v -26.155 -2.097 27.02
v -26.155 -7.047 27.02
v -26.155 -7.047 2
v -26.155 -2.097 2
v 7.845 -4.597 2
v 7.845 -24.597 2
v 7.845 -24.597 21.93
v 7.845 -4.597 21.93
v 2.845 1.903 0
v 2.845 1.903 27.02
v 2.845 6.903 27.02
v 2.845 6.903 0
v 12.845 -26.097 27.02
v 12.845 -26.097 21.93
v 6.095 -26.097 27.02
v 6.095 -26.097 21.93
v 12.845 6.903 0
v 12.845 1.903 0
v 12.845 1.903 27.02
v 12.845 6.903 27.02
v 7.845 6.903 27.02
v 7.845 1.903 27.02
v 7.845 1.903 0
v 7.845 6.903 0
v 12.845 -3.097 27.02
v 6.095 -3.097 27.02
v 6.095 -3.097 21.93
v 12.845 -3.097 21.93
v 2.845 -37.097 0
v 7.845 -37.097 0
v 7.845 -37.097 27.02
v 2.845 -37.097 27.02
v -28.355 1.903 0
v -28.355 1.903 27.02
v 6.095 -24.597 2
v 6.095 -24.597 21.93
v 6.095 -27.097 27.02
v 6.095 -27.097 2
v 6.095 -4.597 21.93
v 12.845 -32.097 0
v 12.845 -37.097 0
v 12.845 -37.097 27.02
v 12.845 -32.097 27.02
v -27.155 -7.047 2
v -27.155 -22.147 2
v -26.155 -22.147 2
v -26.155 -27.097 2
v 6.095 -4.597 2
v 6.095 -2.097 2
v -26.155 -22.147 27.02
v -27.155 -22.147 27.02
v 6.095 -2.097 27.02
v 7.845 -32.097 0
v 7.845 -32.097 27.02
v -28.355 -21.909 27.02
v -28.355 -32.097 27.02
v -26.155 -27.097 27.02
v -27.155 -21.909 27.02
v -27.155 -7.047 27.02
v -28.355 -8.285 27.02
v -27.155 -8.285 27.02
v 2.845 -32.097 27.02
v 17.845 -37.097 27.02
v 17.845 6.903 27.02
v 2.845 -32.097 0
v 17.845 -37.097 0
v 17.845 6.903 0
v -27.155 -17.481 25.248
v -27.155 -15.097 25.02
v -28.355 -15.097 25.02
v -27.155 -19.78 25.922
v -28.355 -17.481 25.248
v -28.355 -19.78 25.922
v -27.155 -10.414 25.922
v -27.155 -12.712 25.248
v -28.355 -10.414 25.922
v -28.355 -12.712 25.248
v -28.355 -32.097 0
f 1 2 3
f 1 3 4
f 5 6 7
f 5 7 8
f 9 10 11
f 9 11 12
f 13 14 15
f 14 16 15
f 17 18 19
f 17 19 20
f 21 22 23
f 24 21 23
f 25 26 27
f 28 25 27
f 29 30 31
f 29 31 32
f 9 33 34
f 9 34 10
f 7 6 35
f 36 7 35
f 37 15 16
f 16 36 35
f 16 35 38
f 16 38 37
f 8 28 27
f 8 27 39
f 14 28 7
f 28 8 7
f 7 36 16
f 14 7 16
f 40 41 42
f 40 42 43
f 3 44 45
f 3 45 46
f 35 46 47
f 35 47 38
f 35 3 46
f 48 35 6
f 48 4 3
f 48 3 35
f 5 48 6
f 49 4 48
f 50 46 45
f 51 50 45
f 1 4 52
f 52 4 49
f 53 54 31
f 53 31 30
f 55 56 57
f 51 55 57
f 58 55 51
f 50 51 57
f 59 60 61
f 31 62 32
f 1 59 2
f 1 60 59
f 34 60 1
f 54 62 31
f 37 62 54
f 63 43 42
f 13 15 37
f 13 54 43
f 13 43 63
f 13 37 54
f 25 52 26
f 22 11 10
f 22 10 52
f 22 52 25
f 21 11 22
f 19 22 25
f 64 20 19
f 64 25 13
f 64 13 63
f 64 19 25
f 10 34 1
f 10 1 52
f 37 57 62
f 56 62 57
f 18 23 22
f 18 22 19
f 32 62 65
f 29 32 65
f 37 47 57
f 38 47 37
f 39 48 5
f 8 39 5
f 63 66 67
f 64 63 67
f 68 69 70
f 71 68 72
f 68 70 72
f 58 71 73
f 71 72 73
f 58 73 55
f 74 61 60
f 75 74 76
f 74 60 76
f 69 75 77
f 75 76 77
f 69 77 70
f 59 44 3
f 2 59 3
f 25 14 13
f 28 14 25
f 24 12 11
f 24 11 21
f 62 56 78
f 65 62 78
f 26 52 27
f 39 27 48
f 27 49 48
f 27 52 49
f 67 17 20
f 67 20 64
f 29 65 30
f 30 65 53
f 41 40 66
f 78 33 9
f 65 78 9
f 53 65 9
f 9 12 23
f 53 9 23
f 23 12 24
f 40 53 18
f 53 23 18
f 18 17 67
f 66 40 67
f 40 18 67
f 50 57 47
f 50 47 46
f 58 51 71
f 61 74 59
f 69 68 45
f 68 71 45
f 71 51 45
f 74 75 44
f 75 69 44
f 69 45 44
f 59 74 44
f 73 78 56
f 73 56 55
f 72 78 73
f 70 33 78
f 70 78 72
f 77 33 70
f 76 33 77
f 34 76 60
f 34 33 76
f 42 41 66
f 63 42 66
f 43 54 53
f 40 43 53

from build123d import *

# Parameters (mm, degrees)
SKETCH1_W                 = 38.2
SKETCH1_H                 = 30
BOSS_EXTRUDE1_DEPTH       = 2
SKETCH2_W                 = 2
SKETCH2_H                 = 20
BOSS_EXTRUDE2_DEPTH       = 27.02
CUT_EXTRUDE1_REACH        = 58.632
SKETCH3_W                 = 7.09
SKETCH3_H                 = 23
CUT_EXTRUDE3_REACH        = 58.632
CUT_EXTRUDE4_DEPTH        = 57.632318808
CUT_EXTRUDE4_DEPTH_BACK   = 57.632318808
SKETCH7_W                 = 32.25
SKETCH7_H                 = 3
BOSS_EXTRUDE3_DEPTH       = 25.02
SKETCH8_W                 = 20
SKETCH8_H                 = 30
BOSS_EXTRUDE4_DEPTH       = 5
BOSS_EXTRUDE5_DEPTH       = 2
BOSS_EXTRUDE6_DEPTH       = 3
BOSS_EXTRUDE7_DEPTH       = 2
SKETCH12_W                = 5
SKETCH12_H                = 27.02
BOSS_EXTRUDE8_DEPTH       = 5
SKETCH13_W                = 5
SKETCH13_H                = 22
BOSS_EXTRUDE10_DEPTH      = 44
SKETCH15_W                = 5
SKETCH15_H                = 27.02
BOSS_EXTRUDE11_DEPTH      = 5
BOSS_EXTRUDE12_DEPTH      = 5.02
BOSS_EXTRUDE12_DEPTH_BACK = 2
SKETCH16_W                = 5
SKETCH16_H                = 44
SKETCH17_W                = 20
SKETCH17_H                = 34
CUT_EXTRUDE5_DEPTH        = 5


with BuildPart() as part:
    # Sketch1 → Boss-Extrude1 (new body)
    with BuildSketch(Plane.XY):
        with Locations((-9.254890621, -15.096829294)):
            Rectangle(SKETCH1_W, SKETCH1_H)
    extrude(amount=BOSS_EXTRUDE1_DEPTH)

    # Sketch2 → Boss-Extrude2 (add)
    with BuildSketch(Plane.XY.offset(2)):
        Polygon((-26.154890621, -2.096829294), (-28.354890621, -2.096829294), (-28.354890621, -30.096829294), (-26.154890621, -30.096829294), (-26.154890621, -22.146829294), (-27.154890621, -22.146829294), (-27.154890621, -7.046829294), (-26.154890621, -7.046829294), align=None)
        Polygon((9.845109379, -0.096829294), (-28.354890621, -0.096829294), (-28.354890621, -2.096829294), (-26.154890621, -2.096829294), (6.095109379, -2.096829294), (9.845109379, -2.096829294), align=None)
        Polygon((9.845109379, -4.596829294), (9.845109379, -2.096829294), (6.095109379, -2.096829294), (6.095109379, -4.596829294), (7.845109379, -4.596829294), align=None)
        with Locations((8.845109379, -14.596829294)):
            Rectangle(SKETCH2_W, SKETCH2_H)
        Polygon((9.845109379, -30.096829294), (9.845109379, -24.596829294), (7.845109379, -24.596829294), (6.095109379, -24.596829294), (6.095109379, -30.096829294), align=None)
    extrude(amount=BOSS_EXTRUDE2_DEPTH)

    # Sketch3 → Cut-Extrude1 (cut, up to next)
    with BuildSketch(Plane(origin=(9.845109379, 0, 0), x_dir=(0, 0, -1), z_dir=(1, 0, 0)), mode=Mode.PRIVATE) as cut_extrude1_sk1:
        with Locations((-25.475, -14.596829294)):
            Rectangle(SKETCH3_W, SKETCH3_H)
    cut_extrude1_tool1 = extrude(cut_extrude1_sk1.sketch, amount=-CUT_EXTRUDE1_REACH, mode=Mode.PRIVATE) & part.part
    add(cut_extrude1_tool1.solids().sort_by_distance((9.845109, -14.596829, 25.475))[0], mode=Mode.SUBTRACT)

    # Sketch4 → Cut-Extrude3 (cut, up to next)
    with BuildSketch(Plane.ZY.offset(28.354890621), mode=Mode.PRIVATE) as cut_extrude3_sk1:
        with BuildLine():
            ThreePointArc((25.02, -15.096829294), (26.063183829, -20.116789453), (29.02, -24.30552084))
            Line((29.02, -24.30552084), (29.02, -15.096829294))
            Line((29.02, -15.096829294), (25.02, -15.096829294))
        make_face()
    cut_extrude3_tool1 = extrude(cut_extrude3_sk1.sketch, amount=-CUT_EXTRUDE3_REACH, mode=Mode.PRIVATE) & part.part
    # Sketch4 → Cut-Extrude3 (cut, up to next)
    with BuildSketch(Plane.ZY.offset(28.354890621), mode=Mode.PRIVATE) as cut_extrude3_sk2:
        with BuildLine():
            ThreePointArc((29.02, -5.888137747), (26.063183829, -10.076869135), (25.02, -15.096829294))
            Line((25.02, -15.096829294), (29.02, -15.096829294))
            Line((29.02, -15.096829294), (29.02, -5.888137747))
        make_face()
    cut_extrude3_tool2 = extrude(cut_extrude3_sk2.sketch, amount=-CUT_EXTRUDE3_REACH, mode=Mode.PRIVATE) & part.part
    # Sketch4 → Cut-Extrude3 (cut, up to next)
    with BuildSketch(Plane.ZY.offset(28.354890621), mode=Mode.PRIVATE) as cut_extrude3_sk3:
        with BuildLine():
            ThreePointArc((25.02, -15.096829294), (26.063183829, -20.116789453), (29.02, -24.30552084))
            Line((29.02, -24.30552084), (29.02, -15.096829294))
            Line((29.02, -15.096829294), (25.02, -15.096829294))
        make_face()
    cut_extrude3_tool3 = extrude(cut_extrude3_sk3.sketch, amount=-CUT_EXTRUDE3_REACH, mode=Mode.PRIVATE) & part.part
    # Sketch4 → Cut-Extrude3 (cut, up to next)
    with BuildSketch(Plane.ZY.offset(28.354890621), mode=Mode.PRIVATE) as cut_extrude3_sk4:
        with BuildLine():
            ThreePointArc((29.02, -5.888137747), (26.063183829, -10.076869135), (25.02, -15.096829294))
            Line((25.02, -15.096829294), (29.02, -15.096829294))
            Line((29.02, -15.096829294), (29.02, -5.888137747))
        make_face()
    cut_extrude3_tool4 = extrude(cut_extrude3_sk4.sketch, amount=-CUT_EXTRUDE3_REACH, mode=Mode.PRIVATE) & part.part
    add(cut_extrude3_tool1.solids().sort_by_distance((-28.354891, -18.637073, 27.396015))[0], mode=Mode.SUBTRACT)
    add(cut_extrude3_tool2.solids().sort_by_distance((-28.354891, -11.556586, 27.396015))[0], mode=Mode.SUBTRACT)
    add(cut_extrude3_tool3.solids().sort_by_distance((-28.354891, -18.637073, 27.396015))[0], mode=Mode.SUBTRACT)
    add(cut_extrude3_tool4.solids().sort_by_distance((-28.354891, -11.556586, 27.396015))[0], mode=Mode.SUBTRACT)

    # Sketch6 → Cut-Extrude4 (cut, two sides: drawn at the far end of the back side and taken through both)
    with BuildSketch(Plane.ZY.offset(28.354890621).offset(-CUT_EXTRUDE4_DEPTH_BACK)):
        with BuildLine():
            Line((29.02, -30.096829294), (29.02, -24.30552084))
            ThreePointArc((29.02, -24.30552084), (27.945480542, -23.169231244), (27.02, -21.90858384))
            Line((27.02, -21.90858384), (27.02, -30.096829294))
            Line((27.02, -30.096829294), (29.02, -30.096829294))
        make_face()
        with BuildLine():
            Line((29.02, -5.888137747), (29.02, -0.096829294))
            Line((29.02, -0.096829294), (27.02, -0.096829294))
            Line((27.02, -0.096829294), (27.02, -8.285074747))
            ThreePointArc((27.02, -8.285074747), (27.945480542, -7.024427343), (29.02, -5.888137747))
        make_face()
    extrude(amount=CUT_EXTRUDE4_DEPTH + CUT_EXTRUDE4_DEPTH_BACK, mode=Mode.SUBTRACT)

    # Sketch7 → Boss-Extrude3 (add)
    with BuildSketch(Plane.XY.offset(2)):
        with Locations((-10.029890621, -28.596829294)):
            Rectangle(SKETCH7_W, SKETCH7_H)
    extrude(amount=BOSS_EXTRUDE3_DEPTH)

    # Sketch8 → Boss-Extrude4 (add)
    with BuildSketch(Plane.ZY.offset(28.354890621)):
        with Locations((10, -15.096829294)):
            Rectangle(SKETCH8_W, SKETCH8_H)
    extrude(amount=BOSS_EXTRUDE4_DEPTH)

    # Sketch9 → Boss-Extrude5 (add)
    with BuildSketch(Plane.XZ.offset(30.096829294)):
        Polygon((-33.354890621, 20), (-28.354890621, 20), (-28.354890621, 27.02), (9.845109379, 27.02), (9.845109379, 0), (-33.354890621, 0), align=None)
    extrude(amount=BOSS_EXTRUDE5_DEPTH)

    # Sketch10 → Boss-Extrude6 (add)
    with BuildSketch(Plane(origin=(9.845109379, 0, 0), x_dir=(0, 0, -1), z_dir=(1, 0, 0))):
        Polygon((-21.93, -3.096829294), (-21.93, -26.096829294), (-27.02, -26.096829294), (-27.02, -32.096829294), (0, -32.096829294), (0, -0.096829294), (-27.02, -0.096829294), (-27.02, -3.096829294), align=None)
    extrude(amount=BOSS_EXTRUDE6_DEPTH)

    # Sketch11 → Boss-Extrude7 (add)
    with BuildSketch(Plane(origin=(0, -0.096829294, 0), x_dir=(1, 0, 0), z_dir=(0, 1, 0))):
        Polygon((-33.354890621, 0), (-33.354890621, -20), (-28.354890621, -20), (-28.354890621, -27.02), (12.845109379, -27.02), (12.845109379, 0), align=None)
    extrude(amount=BOSS_EXTRUDE7_DEPTH)

    # Sketch12 → Boss-Extrude8 (add)
    with BuildSketch(Plane(origin=(0, 1.903170706, 0), x_dir=(1, 0, 0), z_dir=(0, 1, 0))):
        with Locations((5.345109379, -13.51)):
            Rectangle(SKETCH12_W, SKETCH12_H)
    extrude(amount=BOSS_EXTRUDE8_DEPTH)

    # Sketch13 → Boss-Extrude10 (add)
    with BuildSketch(Plane(origin=(0, 6.903170706, 0), x_dir=(1, 0, 0), z_dir=(0, 1, 0))):
        with Locations((15.345109379, -11)):
            Rectangle(SKETCH13_W, SKETCH13_H)
    extrude(amount=-BOSS_EXTRUDE10_DEPTH)

    # Sketch15 → Boss-Extrude11 (add)
    with BuildSketch(Plane(origin=(0, -32.096829294, 0), x_dir=(-1, 0, 0), z_dir=(0, -1, 0))):
        with Locations((-5.345109379, -13.51)):
            Rectangle(SKETCH15_W, SKETCH15_H)
    extrude(amount=BOSS_EXTRUDE11_DEPTH)

    # Sketch16 → Boss-Extrude12 (add, two sides: drawn at the far end of the back side and taken through both)
    with BuildSketch(Plane.XY.offset(22).offset(-BOSS_EXTRUDE12_DEPTH_BACK)):
        with Locations((15.345109379, -15.096829294)):
            Rectangle(SKETCH16_W, SKETCH16_H)
    extrude(amount=BOSS_EXTRUDE12_DEPTH + BOSS_EXTRUDE12_DEPTH_BACK)

    # Sketch17 → Cut-Extrude5 (cut)
    with BuildSketch(Plane.ZY.offset(33.354890621)):
        with Locations((10, -15.096829294)):
            Rectangle(SKETCH17_W, SKETCH17_H)
    extrude(amount=-CUT_EXTRUDE5_DEPTH, mode=Mode.SUBTRACT)


solid = part.part
